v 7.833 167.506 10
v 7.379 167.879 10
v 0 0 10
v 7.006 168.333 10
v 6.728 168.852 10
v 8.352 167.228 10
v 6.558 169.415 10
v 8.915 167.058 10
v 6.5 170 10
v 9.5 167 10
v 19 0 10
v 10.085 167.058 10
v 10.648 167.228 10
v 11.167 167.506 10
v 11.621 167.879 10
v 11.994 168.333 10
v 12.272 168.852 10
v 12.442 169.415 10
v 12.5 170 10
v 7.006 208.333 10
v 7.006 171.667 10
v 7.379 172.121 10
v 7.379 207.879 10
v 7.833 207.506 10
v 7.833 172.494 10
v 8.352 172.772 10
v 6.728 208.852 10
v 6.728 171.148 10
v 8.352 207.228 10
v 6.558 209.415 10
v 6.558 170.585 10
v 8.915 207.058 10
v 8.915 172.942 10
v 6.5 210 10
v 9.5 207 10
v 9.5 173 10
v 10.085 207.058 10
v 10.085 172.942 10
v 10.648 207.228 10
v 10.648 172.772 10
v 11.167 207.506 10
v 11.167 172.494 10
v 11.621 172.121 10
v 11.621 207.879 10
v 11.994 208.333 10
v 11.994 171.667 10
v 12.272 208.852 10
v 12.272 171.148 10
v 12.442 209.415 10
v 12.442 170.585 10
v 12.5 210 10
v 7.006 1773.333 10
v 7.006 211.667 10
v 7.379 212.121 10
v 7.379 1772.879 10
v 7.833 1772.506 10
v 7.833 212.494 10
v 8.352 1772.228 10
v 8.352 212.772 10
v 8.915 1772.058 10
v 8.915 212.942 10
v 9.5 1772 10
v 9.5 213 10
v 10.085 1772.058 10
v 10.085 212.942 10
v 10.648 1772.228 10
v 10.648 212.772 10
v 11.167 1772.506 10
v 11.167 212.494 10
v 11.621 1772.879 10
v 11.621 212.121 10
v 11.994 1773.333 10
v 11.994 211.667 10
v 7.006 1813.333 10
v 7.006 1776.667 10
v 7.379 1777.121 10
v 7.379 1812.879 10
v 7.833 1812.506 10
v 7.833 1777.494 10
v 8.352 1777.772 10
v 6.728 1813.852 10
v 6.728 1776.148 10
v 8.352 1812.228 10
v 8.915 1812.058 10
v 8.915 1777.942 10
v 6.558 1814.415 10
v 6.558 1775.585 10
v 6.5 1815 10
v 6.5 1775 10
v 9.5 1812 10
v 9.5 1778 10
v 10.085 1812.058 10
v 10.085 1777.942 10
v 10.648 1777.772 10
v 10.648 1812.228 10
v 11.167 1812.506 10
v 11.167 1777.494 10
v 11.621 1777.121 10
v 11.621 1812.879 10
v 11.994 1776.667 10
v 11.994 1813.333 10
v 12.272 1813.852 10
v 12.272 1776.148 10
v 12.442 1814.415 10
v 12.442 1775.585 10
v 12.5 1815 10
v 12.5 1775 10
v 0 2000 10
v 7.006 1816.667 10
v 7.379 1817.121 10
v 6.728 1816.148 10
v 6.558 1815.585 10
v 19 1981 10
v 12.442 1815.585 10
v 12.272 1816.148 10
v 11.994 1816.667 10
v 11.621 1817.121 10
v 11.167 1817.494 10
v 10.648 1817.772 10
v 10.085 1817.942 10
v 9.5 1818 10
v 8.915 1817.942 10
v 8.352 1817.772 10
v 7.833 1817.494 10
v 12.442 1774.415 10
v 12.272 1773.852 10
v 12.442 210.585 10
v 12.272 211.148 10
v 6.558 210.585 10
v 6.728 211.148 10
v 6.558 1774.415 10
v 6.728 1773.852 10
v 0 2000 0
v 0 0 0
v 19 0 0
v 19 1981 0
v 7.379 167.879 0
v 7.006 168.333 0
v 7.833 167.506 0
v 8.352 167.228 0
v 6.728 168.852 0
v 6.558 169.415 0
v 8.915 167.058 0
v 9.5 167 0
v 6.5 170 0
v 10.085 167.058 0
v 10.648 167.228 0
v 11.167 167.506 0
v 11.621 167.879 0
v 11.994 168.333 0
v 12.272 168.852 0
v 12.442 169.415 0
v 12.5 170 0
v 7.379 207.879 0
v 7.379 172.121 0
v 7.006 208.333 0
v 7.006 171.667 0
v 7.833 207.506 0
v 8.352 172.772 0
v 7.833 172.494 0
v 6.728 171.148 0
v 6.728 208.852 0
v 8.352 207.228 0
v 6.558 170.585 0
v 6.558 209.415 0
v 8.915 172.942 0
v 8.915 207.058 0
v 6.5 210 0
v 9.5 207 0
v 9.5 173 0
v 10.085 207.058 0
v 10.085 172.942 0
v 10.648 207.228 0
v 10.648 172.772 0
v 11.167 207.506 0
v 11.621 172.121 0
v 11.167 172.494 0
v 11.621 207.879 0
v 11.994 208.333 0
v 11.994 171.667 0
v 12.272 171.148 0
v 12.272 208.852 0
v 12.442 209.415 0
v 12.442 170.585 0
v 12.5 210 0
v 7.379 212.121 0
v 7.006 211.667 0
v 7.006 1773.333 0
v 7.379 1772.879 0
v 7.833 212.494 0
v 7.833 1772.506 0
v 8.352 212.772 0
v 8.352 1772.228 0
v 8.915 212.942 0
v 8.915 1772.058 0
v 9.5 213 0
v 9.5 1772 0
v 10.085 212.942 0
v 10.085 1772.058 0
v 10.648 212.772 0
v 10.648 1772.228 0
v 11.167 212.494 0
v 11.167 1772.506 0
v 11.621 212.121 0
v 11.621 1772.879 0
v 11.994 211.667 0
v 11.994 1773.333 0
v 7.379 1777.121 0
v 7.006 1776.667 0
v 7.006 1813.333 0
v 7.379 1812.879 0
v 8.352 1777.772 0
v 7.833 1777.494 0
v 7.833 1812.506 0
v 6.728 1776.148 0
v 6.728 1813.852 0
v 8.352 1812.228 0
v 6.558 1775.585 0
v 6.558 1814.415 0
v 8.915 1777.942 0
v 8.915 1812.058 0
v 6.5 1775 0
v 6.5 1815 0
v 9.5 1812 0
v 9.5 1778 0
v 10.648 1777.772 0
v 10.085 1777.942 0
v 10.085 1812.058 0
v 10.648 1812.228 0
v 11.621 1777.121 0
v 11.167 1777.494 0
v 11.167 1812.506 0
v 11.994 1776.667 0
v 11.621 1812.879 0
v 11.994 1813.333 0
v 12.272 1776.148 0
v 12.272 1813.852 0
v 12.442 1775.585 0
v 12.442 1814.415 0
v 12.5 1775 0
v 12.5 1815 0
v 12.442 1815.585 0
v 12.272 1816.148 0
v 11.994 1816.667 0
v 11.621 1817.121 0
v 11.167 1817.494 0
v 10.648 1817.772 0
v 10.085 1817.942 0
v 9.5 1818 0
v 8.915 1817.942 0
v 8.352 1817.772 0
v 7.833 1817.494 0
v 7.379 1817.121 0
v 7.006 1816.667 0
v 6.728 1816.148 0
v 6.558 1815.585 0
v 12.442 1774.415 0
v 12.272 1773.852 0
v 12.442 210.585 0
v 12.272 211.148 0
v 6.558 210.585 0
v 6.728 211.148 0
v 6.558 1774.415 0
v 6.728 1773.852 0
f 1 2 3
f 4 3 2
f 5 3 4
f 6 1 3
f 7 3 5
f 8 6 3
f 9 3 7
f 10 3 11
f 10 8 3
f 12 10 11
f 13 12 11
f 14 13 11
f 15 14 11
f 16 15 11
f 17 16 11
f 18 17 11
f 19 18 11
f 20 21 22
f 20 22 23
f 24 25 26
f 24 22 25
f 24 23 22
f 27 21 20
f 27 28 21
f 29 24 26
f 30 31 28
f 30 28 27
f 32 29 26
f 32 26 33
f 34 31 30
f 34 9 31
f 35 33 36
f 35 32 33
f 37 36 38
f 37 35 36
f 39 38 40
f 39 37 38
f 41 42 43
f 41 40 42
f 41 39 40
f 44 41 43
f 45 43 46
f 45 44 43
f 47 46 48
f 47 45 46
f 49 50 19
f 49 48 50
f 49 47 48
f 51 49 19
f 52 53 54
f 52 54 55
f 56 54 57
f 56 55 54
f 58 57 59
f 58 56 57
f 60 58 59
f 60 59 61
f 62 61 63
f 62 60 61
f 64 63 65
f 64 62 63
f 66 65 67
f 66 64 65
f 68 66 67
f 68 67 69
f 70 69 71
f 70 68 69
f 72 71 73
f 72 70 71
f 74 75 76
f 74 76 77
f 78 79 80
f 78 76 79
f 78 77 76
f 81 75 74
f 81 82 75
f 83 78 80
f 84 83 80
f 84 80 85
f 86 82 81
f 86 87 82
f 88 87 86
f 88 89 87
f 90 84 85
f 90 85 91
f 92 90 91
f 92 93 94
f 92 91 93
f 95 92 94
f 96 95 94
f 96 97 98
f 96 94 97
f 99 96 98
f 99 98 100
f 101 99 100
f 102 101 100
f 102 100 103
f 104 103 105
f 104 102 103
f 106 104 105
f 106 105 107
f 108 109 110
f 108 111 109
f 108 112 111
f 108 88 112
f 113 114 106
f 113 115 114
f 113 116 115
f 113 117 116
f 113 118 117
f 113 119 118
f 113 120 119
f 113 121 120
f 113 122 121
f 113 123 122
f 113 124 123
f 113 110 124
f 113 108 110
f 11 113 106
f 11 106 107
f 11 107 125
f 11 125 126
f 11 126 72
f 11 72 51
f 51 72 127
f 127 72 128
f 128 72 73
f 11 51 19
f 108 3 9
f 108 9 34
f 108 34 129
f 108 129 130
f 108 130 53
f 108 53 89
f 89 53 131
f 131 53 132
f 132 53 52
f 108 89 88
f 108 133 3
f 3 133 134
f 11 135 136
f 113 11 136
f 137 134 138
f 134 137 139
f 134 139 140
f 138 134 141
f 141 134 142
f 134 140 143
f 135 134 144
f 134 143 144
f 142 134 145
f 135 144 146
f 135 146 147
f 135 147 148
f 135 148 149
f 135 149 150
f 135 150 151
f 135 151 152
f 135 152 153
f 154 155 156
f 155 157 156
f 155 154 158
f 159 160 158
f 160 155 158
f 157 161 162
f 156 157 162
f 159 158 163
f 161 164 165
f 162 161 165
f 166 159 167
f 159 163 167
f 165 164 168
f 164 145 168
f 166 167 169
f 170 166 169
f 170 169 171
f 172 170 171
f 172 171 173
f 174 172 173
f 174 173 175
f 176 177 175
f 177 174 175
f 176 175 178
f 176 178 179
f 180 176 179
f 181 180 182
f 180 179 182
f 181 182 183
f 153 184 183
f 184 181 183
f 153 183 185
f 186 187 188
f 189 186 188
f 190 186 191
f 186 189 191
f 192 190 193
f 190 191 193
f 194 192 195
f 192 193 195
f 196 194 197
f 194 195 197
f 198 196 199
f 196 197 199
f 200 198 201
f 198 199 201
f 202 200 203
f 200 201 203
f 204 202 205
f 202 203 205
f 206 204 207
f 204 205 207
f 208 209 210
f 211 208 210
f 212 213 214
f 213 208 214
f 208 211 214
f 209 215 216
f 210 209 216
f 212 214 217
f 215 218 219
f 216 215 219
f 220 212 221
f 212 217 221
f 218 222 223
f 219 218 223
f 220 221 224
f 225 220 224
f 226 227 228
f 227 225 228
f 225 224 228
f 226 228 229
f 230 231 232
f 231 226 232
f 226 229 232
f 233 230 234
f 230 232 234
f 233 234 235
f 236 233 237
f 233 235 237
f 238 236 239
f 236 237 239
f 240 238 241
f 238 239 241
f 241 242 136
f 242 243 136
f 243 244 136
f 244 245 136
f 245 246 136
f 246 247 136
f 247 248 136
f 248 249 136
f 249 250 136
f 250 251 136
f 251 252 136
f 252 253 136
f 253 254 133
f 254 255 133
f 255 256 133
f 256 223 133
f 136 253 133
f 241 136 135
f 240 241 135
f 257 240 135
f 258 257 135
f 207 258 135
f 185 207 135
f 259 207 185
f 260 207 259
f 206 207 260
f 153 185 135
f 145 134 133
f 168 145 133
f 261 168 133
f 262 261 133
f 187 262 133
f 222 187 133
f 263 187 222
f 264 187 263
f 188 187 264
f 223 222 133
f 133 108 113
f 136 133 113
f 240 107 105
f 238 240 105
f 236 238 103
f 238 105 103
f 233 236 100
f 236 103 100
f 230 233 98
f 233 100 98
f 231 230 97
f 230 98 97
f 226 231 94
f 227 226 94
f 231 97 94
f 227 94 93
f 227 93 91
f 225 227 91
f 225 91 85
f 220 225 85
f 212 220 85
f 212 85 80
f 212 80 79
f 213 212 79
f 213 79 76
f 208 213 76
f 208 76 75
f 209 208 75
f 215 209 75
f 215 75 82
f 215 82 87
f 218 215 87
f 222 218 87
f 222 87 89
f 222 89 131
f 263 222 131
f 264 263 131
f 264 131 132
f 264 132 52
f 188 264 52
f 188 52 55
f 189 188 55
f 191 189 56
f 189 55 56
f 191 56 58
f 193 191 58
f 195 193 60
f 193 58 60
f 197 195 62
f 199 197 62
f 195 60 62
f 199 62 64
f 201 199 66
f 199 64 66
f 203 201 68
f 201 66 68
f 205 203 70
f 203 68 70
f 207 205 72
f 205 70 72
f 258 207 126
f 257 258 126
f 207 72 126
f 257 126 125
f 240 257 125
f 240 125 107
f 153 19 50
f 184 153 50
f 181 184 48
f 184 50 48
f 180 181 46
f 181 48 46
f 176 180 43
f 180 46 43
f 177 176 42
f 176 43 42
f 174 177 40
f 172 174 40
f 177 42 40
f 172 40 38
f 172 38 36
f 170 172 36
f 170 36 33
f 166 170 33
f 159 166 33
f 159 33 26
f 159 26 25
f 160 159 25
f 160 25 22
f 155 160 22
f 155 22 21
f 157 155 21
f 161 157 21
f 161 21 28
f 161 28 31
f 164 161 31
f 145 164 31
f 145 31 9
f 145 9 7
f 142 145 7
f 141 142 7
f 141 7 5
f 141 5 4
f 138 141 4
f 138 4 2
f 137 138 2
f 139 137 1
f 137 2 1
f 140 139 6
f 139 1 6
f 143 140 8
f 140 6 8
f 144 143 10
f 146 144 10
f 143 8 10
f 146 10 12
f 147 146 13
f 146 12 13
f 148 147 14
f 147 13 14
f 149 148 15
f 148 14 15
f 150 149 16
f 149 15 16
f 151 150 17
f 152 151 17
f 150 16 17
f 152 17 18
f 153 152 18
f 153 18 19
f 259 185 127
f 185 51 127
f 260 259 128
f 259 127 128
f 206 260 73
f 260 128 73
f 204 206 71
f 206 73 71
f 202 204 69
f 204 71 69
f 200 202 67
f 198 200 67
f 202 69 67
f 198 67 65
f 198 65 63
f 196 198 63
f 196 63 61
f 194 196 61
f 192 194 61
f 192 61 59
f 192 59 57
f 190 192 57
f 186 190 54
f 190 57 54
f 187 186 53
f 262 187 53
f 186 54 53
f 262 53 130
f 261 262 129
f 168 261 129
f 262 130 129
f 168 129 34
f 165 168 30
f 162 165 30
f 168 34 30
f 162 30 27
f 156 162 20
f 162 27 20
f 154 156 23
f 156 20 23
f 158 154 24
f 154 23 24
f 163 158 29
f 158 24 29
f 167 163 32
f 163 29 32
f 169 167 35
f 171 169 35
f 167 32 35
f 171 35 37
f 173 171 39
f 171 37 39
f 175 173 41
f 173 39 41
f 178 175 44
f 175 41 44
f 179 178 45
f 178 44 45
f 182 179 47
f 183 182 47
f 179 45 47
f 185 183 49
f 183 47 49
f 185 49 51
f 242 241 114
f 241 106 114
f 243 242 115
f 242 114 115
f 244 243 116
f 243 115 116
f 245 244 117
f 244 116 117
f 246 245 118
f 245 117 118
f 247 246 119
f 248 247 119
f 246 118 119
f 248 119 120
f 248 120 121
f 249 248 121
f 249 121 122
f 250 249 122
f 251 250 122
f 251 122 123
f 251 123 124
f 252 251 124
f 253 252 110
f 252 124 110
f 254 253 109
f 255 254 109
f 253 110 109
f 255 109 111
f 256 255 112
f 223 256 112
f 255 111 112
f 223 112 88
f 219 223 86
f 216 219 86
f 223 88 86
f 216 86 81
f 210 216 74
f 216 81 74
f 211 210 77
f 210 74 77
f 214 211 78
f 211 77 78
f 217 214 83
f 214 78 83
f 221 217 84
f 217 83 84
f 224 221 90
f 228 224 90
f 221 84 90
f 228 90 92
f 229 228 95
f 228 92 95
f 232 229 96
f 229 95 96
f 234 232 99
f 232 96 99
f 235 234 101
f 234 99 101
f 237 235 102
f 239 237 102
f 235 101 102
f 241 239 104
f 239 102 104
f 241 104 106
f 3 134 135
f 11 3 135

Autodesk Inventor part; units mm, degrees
ref_plane "YZ Plane" through (0, 0, 0) normal (1, 0, 0) x (0, 1, 0)
ref_plane "XZ Plane" through (0, 0, 0) normal (0, 1, 0) x (-1, 0, 0)
ref_plane "XY Plane" through (0, 0, 0) normal (0, 0, 1) x (1, 0, 0)
sketch "Sketch1" plane through (0, 0, 0) normal (0, 0, 1) x (1, 0, 0)
  line L0 (0, 0) -> (19, 0)
  line L1 (19, 0) -> (19, 2000)
  line L2 (19, 2000) -> (0, 2000)
  line L3 (0, 2000) -> (0, 0)
  dimension "d0" = 19
  dimension "d1" = 2000
extrude "Extrusion1" add sketch "Sketch1" along normal blind 10
sketch "Sketch2" plane through (0, 0, 10) normal (0, 0, 1) x (1, 0, 0)
  line L0 (19, 0) -> (19, 2000) projected
  line L1 (19, 2000) -> (0, 2000) projected
  line L2 (0, 2000) -> (0, 0) projected
  line L3 (0, 0) -> (19, 0) projected
  line L4 (0, 2000) -> (19, 1981)
  dimension "d7" = 45
extrude "Extrusion2" cut sketch "Sketch2" against normal blind 10 contours L4 L1 L0
sketch "Sketch3" plane through (0, 0, 10) normal (0, 0, 1) x (1, 0, 0)
  circle A0 centre (9.5, 210) radius 3
  circle A1 centre (9.5, 170) radius 3
  line L0 (0, 0) -> (19, 0) projected
  point P0 (9.5, 0)
  dimension "d8" = 6
  dimension "d9" = 40
  dimension "d10" = 170
extrude "Extrusion3" cut sketch "Sketch3" against normal blind 10
sketch "Sketch4" plane through (0, 0, 10) normal (0, 0, 1) x (1, 0, 0)
  circle A0 centre (9.5, 1815) radius 3
  line L0 (19, 1981) -> (0, 2000) projected
  circle A1 centre (9.5, 1775) radius 3
  point P0 (0, 0)
  point P1 (9.5, 1990.5)
  dimension "d14" = 185
  dimension "d15" = 6
  dimension "d16" = 40
extrude "Extrusion4" cut sketch "Sketch4" against normal blind 10
properties part number "Dichtung_links"
